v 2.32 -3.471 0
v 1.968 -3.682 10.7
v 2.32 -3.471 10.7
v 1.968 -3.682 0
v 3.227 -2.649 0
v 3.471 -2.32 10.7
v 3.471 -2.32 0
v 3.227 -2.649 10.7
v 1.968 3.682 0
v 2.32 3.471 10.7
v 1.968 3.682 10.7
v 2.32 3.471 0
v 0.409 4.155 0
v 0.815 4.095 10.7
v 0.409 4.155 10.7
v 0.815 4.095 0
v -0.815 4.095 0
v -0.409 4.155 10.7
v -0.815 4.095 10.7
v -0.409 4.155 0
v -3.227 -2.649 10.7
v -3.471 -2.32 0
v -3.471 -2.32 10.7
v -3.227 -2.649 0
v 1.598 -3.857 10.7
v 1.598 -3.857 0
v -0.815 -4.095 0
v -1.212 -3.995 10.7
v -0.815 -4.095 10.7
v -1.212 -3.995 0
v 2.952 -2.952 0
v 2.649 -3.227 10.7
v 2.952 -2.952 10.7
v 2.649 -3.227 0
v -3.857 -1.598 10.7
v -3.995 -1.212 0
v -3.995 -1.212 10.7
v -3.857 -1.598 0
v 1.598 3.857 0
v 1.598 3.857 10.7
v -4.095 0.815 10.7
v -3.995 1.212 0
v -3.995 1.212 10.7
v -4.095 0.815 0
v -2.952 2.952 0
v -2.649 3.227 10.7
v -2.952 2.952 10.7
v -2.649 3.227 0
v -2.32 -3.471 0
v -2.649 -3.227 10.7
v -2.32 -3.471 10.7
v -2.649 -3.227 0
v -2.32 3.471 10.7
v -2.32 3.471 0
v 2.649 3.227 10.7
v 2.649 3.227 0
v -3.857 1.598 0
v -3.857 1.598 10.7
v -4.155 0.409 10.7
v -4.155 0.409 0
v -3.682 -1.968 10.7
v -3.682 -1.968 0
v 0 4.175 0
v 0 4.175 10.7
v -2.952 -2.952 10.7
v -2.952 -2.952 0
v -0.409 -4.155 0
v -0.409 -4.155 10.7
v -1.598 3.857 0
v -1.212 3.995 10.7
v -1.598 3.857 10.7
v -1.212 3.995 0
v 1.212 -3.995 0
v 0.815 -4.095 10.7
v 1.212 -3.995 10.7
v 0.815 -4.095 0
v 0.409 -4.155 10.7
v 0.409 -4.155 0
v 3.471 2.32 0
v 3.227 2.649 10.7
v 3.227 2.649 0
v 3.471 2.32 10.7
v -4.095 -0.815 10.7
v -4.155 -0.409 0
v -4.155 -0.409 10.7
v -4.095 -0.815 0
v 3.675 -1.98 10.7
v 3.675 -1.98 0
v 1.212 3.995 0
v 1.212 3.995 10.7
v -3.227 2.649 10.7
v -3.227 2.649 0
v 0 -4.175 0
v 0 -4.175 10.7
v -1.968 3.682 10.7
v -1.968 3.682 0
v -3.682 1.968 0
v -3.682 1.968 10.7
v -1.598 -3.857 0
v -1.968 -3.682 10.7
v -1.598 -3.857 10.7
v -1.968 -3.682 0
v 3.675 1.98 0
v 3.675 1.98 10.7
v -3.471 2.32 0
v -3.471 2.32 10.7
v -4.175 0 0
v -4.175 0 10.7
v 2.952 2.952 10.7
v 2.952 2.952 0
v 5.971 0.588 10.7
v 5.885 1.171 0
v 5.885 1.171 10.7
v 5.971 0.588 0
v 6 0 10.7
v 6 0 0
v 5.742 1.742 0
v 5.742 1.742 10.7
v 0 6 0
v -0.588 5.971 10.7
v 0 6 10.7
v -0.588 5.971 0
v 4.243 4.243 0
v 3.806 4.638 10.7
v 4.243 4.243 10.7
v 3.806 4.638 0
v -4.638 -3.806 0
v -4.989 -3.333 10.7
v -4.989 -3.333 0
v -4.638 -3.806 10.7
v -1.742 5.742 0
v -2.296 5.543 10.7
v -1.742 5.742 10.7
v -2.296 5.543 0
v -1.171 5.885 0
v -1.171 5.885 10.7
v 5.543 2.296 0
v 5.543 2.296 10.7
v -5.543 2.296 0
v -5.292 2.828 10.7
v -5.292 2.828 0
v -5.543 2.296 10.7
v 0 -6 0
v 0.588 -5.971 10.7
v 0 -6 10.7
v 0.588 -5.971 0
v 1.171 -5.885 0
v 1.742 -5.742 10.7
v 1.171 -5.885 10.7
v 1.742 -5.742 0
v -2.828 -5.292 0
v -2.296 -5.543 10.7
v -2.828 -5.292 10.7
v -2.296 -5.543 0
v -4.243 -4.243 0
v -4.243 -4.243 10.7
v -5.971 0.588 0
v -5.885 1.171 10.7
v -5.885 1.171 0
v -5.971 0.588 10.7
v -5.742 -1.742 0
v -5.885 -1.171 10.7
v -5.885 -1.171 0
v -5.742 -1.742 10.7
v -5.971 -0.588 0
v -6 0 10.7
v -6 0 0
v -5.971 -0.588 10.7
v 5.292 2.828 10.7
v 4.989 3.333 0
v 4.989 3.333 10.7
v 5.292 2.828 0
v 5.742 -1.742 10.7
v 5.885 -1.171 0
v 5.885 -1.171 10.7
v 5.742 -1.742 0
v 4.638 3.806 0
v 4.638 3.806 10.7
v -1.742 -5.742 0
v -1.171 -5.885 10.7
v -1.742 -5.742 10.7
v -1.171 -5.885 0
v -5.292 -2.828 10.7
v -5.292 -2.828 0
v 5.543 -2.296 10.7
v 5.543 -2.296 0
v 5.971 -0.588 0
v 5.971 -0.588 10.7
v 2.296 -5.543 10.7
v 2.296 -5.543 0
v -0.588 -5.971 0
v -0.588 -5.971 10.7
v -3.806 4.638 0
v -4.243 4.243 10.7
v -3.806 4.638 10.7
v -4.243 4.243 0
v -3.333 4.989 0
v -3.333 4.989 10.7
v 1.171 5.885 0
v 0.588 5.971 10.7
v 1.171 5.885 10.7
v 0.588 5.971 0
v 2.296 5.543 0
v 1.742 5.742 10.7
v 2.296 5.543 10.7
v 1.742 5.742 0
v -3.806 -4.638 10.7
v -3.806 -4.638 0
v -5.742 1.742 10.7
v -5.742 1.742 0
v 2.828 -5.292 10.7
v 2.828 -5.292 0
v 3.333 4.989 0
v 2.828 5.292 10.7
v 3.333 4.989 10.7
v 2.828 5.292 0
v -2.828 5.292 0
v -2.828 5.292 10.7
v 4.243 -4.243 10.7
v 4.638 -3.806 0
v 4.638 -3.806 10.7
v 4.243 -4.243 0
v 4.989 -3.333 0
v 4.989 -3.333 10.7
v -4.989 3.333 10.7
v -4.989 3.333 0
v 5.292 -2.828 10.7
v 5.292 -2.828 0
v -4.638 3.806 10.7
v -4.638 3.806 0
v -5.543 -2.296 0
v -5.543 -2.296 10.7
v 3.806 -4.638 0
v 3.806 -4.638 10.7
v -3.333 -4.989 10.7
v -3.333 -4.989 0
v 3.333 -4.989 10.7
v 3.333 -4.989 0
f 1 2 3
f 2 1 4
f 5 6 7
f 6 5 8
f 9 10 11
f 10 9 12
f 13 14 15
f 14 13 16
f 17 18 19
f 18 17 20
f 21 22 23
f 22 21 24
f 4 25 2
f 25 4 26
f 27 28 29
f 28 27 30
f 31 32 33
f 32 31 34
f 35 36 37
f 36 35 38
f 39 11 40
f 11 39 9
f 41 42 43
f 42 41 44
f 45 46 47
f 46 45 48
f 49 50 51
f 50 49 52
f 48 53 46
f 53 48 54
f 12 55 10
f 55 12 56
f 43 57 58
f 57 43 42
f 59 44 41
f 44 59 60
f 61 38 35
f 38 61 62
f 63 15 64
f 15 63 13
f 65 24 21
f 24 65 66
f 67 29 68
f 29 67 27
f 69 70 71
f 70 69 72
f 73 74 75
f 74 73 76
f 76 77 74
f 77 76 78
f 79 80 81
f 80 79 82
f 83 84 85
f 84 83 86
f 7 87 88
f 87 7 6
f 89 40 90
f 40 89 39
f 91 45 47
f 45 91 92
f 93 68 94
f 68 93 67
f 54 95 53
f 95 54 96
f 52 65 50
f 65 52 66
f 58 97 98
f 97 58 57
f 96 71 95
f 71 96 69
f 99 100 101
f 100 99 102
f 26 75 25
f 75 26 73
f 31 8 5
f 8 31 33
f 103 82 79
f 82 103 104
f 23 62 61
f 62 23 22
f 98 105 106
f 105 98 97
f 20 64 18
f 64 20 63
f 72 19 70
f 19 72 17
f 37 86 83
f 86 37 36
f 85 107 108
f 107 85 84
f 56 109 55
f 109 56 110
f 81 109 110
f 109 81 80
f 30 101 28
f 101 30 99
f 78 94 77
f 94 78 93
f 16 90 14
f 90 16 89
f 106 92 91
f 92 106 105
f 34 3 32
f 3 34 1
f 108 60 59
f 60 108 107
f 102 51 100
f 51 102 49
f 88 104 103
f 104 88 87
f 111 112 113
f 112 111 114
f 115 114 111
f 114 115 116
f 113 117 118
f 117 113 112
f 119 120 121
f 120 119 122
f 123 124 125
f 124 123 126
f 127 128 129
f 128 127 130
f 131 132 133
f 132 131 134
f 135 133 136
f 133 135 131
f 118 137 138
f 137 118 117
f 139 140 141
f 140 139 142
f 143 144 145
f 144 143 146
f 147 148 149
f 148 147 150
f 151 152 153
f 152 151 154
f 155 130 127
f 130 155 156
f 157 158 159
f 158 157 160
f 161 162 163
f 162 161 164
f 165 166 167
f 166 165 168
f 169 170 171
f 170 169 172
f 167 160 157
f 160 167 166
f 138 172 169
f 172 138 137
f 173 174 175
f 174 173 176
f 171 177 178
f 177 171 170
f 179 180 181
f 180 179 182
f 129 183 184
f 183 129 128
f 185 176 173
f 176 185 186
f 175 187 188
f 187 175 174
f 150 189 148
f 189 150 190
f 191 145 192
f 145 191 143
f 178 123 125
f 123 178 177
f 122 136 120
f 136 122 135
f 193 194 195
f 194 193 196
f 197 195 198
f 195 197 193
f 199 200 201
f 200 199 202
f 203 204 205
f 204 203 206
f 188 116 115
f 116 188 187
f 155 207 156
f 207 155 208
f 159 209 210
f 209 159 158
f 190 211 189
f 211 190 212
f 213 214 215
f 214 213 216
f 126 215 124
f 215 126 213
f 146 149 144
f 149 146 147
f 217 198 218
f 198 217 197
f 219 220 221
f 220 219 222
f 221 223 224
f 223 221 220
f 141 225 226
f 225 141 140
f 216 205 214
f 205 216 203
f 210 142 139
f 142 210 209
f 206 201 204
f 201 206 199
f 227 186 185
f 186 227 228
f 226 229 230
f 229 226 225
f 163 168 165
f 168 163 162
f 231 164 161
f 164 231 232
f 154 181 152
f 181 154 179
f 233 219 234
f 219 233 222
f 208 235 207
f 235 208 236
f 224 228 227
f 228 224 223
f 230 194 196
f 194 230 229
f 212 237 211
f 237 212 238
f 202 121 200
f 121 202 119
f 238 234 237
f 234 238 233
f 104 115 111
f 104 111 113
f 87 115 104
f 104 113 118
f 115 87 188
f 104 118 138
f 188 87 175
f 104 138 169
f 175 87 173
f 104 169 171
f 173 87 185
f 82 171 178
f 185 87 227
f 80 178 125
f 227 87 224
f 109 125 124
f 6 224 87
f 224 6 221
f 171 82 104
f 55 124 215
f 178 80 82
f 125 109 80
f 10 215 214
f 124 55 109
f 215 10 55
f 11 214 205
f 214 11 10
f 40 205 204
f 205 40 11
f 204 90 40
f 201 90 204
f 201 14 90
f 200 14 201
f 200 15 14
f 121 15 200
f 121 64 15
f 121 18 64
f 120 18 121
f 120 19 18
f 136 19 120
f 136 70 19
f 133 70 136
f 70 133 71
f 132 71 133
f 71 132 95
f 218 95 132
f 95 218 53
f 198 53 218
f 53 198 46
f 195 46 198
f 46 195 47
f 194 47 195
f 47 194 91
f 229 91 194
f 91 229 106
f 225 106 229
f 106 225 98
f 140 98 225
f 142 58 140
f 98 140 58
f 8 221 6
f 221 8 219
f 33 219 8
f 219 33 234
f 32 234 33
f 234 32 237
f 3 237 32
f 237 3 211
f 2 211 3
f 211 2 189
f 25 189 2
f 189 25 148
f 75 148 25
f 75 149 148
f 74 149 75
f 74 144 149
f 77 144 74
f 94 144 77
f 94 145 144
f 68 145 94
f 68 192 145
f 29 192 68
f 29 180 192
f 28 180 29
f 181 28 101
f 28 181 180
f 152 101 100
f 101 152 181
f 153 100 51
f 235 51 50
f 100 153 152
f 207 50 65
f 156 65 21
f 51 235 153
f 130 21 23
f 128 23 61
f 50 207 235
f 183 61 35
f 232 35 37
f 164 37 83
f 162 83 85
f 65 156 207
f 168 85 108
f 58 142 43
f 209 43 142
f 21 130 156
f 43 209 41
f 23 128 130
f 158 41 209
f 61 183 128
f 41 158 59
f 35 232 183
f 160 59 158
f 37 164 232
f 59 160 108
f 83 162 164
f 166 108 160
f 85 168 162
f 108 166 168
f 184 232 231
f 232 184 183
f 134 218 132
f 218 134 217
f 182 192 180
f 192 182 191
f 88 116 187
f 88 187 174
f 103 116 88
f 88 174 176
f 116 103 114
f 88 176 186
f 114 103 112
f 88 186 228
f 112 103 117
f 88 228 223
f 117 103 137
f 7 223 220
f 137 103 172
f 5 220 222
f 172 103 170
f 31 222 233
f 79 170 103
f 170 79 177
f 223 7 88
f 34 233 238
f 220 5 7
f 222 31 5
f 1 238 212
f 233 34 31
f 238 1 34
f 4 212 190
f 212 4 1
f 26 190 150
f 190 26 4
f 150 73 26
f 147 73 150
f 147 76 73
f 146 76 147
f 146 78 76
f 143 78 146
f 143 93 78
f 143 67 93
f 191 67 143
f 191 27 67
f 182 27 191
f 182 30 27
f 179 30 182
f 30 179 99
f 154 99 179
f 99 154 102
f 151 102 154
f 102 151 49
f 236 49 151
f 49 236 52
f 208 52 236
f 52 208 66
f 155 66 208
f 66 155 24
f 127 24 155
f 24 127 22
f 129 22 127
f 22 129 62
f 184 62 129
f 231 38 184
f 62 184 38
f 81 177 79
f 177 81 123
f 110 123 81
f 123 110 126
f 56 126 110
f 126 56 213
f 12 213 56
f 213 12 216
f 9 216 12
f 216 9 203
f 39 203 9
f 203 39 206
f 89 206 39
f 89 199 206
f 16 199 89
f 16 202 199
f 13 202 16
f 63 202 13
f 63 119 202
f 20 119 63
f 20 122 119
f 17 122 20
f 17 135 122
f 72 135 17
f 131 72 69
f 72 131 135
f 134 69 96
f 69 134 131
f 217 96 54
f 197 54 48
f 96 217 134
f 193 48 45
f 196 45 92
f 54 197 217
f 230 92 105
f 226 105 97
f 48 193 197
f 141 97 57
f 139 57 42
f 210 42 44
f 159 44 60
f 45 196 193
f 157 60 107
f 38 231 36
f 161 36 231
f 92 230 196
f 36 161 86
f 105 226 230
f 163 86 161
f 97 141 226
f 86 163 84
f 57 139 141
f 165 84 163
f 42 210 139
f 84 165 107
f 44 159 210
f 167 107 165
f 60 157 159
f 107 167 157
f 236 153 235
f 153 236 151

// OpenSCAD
// file: parameters.scad
// =============================================================================
// Gen-BS — nightly 2026-10-09 (physics_scorer, honest magpylib watts)
// Pull the whole machine 2 mm inward: poles at R48 (was R50) with 26–68 mm bobbins and an 18.5 mm build. Shorter mean turn length lets each coil hold 612 turns on about 356 m of copper — ~14 m less than Gen-BO, which leaves real slack on a ~390 m spool for leads, a re-wind or a short spool — for about 1.7 % less power. Same Ø134 steel discs as Gen-BO.
// Clocking 0 deg (magnets N facing S) + D-flat keyed bore + index notch + flip-symmetric hole map.
// Windable 2-piece bobbin; turns = physics_scorer turns_fit; copper only between flanges.
// Steel back-iron: 2× Ø134 × 4.76 mm (3/16") mild-steel discs (steel_backiron_disc.dxf); magnets sit ON the steel
// (through-pockets) -> score with --back-iron.
// =============================================================================
topology            = "dual_rotor";

// --- Wire / winding (physics_scorer winding-fit) -------------------------------
wire_awg            = 26;
wire_od             = 0.45;     // insulated OD mm (bare 0.405)
fill_realistic      = 0.65;     // insulated-wire area / window (DENSE layered wind with a jig; scorer cap 0.65)
turns               = 612;       // = physics_scorer turns_fit (do NOT raise)
coil_former_type    = "bobbin";
coil_core_inset     = 18.50;     // radial copper build: hub = copper boundary inset by this
wind_build_axial    = 0.0;      // nothing proud of the flanges
wind_build_radial   = 0.0;

// --- Bobbin (base + lid) ---------------------------------------------------------
coil_id_r           = 26.00;    // copper boundary sector
coil_od_r           = 68.00;
span_deg            = 52.72;    // = pitch - 2*asin((wall+0.85)/coil_id_r) -> >=1.2 mm stator web
former_web          = 8.10;     // copper height between flanges (TALL copper: steel keeps Bz up)
flange_t            = 0.80;     // >= 0.8 mm FDM wall rule (tall winds push on the flanges)
wall                = 0.80;     // flange lip beyond copper
former_bare_h       = former_web + 2 * flange_t;
coil_envelope_h     = former_bare_h + 2 * wind_build_axial;
tab_w               = 7.0;
tab_len             = 7.0;
tab_h               = former_bare_h / 2;
pin_d               = 1.9;      // 1.75 mm filament locating pin
coil_mount_r        = coil_od_r + 0.2 + 4.0;
lead_y              = 1.6;
lead_slot_w         = 0.9;
lead_groove_d       = 0.6;

// --- Gap -------------------------------------------------------------------------
run_clear           = 0.50;     // rotor face -> flange
gap_spacer_h        = run_clear + wind_build_axial;
m2m                 = coil_envelope_h + 2 * run_clear;   // rotor face to rotor face (= gap_sleeve length)

// --- Stator ----------------------------------------------------------------------
coil_stations       = 6;
bay_clear           = 0.25;
stator_thick        = former_bare_h;                        // bobbins flush both faces
stator_od           = 156.0;
shaft_clear_stator  = 14.0;     // stator is static; gap sleeve OD 12 spins inside

// --- Rotor(s) --------------------------------------------------------------------
magnet_Br           = 1.43;     // N52
magnet_d_large      = 20.0;
magnet_h_large      = 5.0;      // one O20x5 per pocket
magnet_h_small      = 5.0;      // one O5x5 per pocket
halbach_magnetisation = "diametric"; // O5x5 assist magnets MUST be DIAMETRICALLY magnetised (tangential)
rotor_b_same_axis   = true;     // same-index magnets share one axis: N faces S across the gap
large_pocket_d      = 20.3;
small_pocket_d      = 5.3;
pocket_h            = 5.00;     // THROUGH the carrier: magnet back face sits on the steel disc (FLUSH seat: carrier = magnet height, magnet face level with the rotor face)
large_n             = 8;
R_large             = 48.0;
R_small_inner       = 41.8;
R_small_mid         = 48.0;
R_small_outer       = 54.2;
small_r_list        = [R_small_inner, R_small_mid, R_small_outer];   // O5 pockets between poles
carrier_od          = 134.0;
carrier_thick       = pocket_h;
hub_h               = 12.0;     // > steel_t + insert: radial set-screw clears the steel
hub_od              = 24.0;     // slim hub so the M4 brace rods fit at R~18 inside the coil ring
hub_insert_d        = 4.0;      // M3 heat-set insert, radial, bears on the D-flat
rotor_b_offset_deg  = 0.0;      // CLOCKING: magnets directly opposite
shaft_key           = "dflat";
dflat_depth         = 0.5;      // 8 mm shaft with 0.5 mm flat (7.5 across flat)
index_notch_d       = 3.0;

// --- Steel back-iron (buyable laser-cut) -------------------------------------------
steel_t             = 4.76;      // mild steel thickness (image method ignores it; sized from steel_flux.py so the return path stays well below saturation)
steel_center_hole   = 26.0;     // slips over the rotor hub (OD 24)
steel_od            = carrier_od;   // steel disc OD = rotor carrier OD

// --- Modular MAX interface ----------------------------------------------------------
shaft_bore          = 8.35;
dflat_x             = 4.0 - dflat_depth + (shaft_bore - 8.0) / 2;
bearing_d           = 21.85;
bearing_h           = 7.2;
m3_clear            = 3.5;
bolt_r_inner        = 30.0;     // M3 steel-disc clamp bolts (inside the magnet ring)
bolt_n_inner        = 4;
bolt_inner_angles   = [0, 90, 180, 270];
bolt_r_outer        = 63.0;     // M3 steel-disc clamp bolts (outside the magnet ring)
bolt_outer_angles   = [45, 135, 225, 315];
flange_bolt_r       = 73.0;     // frame rods: OUTSIDE the rotor OD (rotors spin inside them)
flange_bolt_n       = 6;
flange_bolt_offset  = 30.00;    // between coil stations -> never cuts a lead groove/tab
brace_r             = 18.0;
brace_d             = 4.3;      // temporary M4 jack rods (assembly only)
brace_n             = 4;
brace_angles        = [45, 135, 225, 315];          // flip-symmetric

spacer_pad_od       = 14.0;
spacer_pad_id       = m3_clear;
endbell_od          = 156.0;
endbell_thick       = 8.0;
endbell_shaft_clear = 10.0;
collar_h            = 10.0;
standoff_od         = 9.0;
frame_standoff_h    = run_clear + carrier_thick + hub_h + collar_h + 2.0;
sleeve_od           = 12.0;
plate_max_mm        = 410;

$fn = 64;
// main file
// Gen-BS — gap sleeve: rigid spacer on the shaft BETWEEN the two rotor carriers (passes through the stator
// hole). Length = m2m, so it sets the magnet gap and carries the full magnet pull. Print x1, upright.
include <parameters.scad>;
$fn = 64;
// D-flat keyed bore: flat faces +X (angle 0 = magnet pocket 0 = index notch)
module dflat_bore(h) {
    intersection() {
        cylinder(d=shaft_bore, h=h);
        translate([-shaft_bore, -shaft_bore, 0]) cube([shaft_bore + dflat_x, 2*shaft_bore, h]);
    }
}

difference() {
    cylinder(d=sleeve_od, h=m2m);
    translate([0, 0, -0.1]) dflat_bore(m2m + 0.2);
}
